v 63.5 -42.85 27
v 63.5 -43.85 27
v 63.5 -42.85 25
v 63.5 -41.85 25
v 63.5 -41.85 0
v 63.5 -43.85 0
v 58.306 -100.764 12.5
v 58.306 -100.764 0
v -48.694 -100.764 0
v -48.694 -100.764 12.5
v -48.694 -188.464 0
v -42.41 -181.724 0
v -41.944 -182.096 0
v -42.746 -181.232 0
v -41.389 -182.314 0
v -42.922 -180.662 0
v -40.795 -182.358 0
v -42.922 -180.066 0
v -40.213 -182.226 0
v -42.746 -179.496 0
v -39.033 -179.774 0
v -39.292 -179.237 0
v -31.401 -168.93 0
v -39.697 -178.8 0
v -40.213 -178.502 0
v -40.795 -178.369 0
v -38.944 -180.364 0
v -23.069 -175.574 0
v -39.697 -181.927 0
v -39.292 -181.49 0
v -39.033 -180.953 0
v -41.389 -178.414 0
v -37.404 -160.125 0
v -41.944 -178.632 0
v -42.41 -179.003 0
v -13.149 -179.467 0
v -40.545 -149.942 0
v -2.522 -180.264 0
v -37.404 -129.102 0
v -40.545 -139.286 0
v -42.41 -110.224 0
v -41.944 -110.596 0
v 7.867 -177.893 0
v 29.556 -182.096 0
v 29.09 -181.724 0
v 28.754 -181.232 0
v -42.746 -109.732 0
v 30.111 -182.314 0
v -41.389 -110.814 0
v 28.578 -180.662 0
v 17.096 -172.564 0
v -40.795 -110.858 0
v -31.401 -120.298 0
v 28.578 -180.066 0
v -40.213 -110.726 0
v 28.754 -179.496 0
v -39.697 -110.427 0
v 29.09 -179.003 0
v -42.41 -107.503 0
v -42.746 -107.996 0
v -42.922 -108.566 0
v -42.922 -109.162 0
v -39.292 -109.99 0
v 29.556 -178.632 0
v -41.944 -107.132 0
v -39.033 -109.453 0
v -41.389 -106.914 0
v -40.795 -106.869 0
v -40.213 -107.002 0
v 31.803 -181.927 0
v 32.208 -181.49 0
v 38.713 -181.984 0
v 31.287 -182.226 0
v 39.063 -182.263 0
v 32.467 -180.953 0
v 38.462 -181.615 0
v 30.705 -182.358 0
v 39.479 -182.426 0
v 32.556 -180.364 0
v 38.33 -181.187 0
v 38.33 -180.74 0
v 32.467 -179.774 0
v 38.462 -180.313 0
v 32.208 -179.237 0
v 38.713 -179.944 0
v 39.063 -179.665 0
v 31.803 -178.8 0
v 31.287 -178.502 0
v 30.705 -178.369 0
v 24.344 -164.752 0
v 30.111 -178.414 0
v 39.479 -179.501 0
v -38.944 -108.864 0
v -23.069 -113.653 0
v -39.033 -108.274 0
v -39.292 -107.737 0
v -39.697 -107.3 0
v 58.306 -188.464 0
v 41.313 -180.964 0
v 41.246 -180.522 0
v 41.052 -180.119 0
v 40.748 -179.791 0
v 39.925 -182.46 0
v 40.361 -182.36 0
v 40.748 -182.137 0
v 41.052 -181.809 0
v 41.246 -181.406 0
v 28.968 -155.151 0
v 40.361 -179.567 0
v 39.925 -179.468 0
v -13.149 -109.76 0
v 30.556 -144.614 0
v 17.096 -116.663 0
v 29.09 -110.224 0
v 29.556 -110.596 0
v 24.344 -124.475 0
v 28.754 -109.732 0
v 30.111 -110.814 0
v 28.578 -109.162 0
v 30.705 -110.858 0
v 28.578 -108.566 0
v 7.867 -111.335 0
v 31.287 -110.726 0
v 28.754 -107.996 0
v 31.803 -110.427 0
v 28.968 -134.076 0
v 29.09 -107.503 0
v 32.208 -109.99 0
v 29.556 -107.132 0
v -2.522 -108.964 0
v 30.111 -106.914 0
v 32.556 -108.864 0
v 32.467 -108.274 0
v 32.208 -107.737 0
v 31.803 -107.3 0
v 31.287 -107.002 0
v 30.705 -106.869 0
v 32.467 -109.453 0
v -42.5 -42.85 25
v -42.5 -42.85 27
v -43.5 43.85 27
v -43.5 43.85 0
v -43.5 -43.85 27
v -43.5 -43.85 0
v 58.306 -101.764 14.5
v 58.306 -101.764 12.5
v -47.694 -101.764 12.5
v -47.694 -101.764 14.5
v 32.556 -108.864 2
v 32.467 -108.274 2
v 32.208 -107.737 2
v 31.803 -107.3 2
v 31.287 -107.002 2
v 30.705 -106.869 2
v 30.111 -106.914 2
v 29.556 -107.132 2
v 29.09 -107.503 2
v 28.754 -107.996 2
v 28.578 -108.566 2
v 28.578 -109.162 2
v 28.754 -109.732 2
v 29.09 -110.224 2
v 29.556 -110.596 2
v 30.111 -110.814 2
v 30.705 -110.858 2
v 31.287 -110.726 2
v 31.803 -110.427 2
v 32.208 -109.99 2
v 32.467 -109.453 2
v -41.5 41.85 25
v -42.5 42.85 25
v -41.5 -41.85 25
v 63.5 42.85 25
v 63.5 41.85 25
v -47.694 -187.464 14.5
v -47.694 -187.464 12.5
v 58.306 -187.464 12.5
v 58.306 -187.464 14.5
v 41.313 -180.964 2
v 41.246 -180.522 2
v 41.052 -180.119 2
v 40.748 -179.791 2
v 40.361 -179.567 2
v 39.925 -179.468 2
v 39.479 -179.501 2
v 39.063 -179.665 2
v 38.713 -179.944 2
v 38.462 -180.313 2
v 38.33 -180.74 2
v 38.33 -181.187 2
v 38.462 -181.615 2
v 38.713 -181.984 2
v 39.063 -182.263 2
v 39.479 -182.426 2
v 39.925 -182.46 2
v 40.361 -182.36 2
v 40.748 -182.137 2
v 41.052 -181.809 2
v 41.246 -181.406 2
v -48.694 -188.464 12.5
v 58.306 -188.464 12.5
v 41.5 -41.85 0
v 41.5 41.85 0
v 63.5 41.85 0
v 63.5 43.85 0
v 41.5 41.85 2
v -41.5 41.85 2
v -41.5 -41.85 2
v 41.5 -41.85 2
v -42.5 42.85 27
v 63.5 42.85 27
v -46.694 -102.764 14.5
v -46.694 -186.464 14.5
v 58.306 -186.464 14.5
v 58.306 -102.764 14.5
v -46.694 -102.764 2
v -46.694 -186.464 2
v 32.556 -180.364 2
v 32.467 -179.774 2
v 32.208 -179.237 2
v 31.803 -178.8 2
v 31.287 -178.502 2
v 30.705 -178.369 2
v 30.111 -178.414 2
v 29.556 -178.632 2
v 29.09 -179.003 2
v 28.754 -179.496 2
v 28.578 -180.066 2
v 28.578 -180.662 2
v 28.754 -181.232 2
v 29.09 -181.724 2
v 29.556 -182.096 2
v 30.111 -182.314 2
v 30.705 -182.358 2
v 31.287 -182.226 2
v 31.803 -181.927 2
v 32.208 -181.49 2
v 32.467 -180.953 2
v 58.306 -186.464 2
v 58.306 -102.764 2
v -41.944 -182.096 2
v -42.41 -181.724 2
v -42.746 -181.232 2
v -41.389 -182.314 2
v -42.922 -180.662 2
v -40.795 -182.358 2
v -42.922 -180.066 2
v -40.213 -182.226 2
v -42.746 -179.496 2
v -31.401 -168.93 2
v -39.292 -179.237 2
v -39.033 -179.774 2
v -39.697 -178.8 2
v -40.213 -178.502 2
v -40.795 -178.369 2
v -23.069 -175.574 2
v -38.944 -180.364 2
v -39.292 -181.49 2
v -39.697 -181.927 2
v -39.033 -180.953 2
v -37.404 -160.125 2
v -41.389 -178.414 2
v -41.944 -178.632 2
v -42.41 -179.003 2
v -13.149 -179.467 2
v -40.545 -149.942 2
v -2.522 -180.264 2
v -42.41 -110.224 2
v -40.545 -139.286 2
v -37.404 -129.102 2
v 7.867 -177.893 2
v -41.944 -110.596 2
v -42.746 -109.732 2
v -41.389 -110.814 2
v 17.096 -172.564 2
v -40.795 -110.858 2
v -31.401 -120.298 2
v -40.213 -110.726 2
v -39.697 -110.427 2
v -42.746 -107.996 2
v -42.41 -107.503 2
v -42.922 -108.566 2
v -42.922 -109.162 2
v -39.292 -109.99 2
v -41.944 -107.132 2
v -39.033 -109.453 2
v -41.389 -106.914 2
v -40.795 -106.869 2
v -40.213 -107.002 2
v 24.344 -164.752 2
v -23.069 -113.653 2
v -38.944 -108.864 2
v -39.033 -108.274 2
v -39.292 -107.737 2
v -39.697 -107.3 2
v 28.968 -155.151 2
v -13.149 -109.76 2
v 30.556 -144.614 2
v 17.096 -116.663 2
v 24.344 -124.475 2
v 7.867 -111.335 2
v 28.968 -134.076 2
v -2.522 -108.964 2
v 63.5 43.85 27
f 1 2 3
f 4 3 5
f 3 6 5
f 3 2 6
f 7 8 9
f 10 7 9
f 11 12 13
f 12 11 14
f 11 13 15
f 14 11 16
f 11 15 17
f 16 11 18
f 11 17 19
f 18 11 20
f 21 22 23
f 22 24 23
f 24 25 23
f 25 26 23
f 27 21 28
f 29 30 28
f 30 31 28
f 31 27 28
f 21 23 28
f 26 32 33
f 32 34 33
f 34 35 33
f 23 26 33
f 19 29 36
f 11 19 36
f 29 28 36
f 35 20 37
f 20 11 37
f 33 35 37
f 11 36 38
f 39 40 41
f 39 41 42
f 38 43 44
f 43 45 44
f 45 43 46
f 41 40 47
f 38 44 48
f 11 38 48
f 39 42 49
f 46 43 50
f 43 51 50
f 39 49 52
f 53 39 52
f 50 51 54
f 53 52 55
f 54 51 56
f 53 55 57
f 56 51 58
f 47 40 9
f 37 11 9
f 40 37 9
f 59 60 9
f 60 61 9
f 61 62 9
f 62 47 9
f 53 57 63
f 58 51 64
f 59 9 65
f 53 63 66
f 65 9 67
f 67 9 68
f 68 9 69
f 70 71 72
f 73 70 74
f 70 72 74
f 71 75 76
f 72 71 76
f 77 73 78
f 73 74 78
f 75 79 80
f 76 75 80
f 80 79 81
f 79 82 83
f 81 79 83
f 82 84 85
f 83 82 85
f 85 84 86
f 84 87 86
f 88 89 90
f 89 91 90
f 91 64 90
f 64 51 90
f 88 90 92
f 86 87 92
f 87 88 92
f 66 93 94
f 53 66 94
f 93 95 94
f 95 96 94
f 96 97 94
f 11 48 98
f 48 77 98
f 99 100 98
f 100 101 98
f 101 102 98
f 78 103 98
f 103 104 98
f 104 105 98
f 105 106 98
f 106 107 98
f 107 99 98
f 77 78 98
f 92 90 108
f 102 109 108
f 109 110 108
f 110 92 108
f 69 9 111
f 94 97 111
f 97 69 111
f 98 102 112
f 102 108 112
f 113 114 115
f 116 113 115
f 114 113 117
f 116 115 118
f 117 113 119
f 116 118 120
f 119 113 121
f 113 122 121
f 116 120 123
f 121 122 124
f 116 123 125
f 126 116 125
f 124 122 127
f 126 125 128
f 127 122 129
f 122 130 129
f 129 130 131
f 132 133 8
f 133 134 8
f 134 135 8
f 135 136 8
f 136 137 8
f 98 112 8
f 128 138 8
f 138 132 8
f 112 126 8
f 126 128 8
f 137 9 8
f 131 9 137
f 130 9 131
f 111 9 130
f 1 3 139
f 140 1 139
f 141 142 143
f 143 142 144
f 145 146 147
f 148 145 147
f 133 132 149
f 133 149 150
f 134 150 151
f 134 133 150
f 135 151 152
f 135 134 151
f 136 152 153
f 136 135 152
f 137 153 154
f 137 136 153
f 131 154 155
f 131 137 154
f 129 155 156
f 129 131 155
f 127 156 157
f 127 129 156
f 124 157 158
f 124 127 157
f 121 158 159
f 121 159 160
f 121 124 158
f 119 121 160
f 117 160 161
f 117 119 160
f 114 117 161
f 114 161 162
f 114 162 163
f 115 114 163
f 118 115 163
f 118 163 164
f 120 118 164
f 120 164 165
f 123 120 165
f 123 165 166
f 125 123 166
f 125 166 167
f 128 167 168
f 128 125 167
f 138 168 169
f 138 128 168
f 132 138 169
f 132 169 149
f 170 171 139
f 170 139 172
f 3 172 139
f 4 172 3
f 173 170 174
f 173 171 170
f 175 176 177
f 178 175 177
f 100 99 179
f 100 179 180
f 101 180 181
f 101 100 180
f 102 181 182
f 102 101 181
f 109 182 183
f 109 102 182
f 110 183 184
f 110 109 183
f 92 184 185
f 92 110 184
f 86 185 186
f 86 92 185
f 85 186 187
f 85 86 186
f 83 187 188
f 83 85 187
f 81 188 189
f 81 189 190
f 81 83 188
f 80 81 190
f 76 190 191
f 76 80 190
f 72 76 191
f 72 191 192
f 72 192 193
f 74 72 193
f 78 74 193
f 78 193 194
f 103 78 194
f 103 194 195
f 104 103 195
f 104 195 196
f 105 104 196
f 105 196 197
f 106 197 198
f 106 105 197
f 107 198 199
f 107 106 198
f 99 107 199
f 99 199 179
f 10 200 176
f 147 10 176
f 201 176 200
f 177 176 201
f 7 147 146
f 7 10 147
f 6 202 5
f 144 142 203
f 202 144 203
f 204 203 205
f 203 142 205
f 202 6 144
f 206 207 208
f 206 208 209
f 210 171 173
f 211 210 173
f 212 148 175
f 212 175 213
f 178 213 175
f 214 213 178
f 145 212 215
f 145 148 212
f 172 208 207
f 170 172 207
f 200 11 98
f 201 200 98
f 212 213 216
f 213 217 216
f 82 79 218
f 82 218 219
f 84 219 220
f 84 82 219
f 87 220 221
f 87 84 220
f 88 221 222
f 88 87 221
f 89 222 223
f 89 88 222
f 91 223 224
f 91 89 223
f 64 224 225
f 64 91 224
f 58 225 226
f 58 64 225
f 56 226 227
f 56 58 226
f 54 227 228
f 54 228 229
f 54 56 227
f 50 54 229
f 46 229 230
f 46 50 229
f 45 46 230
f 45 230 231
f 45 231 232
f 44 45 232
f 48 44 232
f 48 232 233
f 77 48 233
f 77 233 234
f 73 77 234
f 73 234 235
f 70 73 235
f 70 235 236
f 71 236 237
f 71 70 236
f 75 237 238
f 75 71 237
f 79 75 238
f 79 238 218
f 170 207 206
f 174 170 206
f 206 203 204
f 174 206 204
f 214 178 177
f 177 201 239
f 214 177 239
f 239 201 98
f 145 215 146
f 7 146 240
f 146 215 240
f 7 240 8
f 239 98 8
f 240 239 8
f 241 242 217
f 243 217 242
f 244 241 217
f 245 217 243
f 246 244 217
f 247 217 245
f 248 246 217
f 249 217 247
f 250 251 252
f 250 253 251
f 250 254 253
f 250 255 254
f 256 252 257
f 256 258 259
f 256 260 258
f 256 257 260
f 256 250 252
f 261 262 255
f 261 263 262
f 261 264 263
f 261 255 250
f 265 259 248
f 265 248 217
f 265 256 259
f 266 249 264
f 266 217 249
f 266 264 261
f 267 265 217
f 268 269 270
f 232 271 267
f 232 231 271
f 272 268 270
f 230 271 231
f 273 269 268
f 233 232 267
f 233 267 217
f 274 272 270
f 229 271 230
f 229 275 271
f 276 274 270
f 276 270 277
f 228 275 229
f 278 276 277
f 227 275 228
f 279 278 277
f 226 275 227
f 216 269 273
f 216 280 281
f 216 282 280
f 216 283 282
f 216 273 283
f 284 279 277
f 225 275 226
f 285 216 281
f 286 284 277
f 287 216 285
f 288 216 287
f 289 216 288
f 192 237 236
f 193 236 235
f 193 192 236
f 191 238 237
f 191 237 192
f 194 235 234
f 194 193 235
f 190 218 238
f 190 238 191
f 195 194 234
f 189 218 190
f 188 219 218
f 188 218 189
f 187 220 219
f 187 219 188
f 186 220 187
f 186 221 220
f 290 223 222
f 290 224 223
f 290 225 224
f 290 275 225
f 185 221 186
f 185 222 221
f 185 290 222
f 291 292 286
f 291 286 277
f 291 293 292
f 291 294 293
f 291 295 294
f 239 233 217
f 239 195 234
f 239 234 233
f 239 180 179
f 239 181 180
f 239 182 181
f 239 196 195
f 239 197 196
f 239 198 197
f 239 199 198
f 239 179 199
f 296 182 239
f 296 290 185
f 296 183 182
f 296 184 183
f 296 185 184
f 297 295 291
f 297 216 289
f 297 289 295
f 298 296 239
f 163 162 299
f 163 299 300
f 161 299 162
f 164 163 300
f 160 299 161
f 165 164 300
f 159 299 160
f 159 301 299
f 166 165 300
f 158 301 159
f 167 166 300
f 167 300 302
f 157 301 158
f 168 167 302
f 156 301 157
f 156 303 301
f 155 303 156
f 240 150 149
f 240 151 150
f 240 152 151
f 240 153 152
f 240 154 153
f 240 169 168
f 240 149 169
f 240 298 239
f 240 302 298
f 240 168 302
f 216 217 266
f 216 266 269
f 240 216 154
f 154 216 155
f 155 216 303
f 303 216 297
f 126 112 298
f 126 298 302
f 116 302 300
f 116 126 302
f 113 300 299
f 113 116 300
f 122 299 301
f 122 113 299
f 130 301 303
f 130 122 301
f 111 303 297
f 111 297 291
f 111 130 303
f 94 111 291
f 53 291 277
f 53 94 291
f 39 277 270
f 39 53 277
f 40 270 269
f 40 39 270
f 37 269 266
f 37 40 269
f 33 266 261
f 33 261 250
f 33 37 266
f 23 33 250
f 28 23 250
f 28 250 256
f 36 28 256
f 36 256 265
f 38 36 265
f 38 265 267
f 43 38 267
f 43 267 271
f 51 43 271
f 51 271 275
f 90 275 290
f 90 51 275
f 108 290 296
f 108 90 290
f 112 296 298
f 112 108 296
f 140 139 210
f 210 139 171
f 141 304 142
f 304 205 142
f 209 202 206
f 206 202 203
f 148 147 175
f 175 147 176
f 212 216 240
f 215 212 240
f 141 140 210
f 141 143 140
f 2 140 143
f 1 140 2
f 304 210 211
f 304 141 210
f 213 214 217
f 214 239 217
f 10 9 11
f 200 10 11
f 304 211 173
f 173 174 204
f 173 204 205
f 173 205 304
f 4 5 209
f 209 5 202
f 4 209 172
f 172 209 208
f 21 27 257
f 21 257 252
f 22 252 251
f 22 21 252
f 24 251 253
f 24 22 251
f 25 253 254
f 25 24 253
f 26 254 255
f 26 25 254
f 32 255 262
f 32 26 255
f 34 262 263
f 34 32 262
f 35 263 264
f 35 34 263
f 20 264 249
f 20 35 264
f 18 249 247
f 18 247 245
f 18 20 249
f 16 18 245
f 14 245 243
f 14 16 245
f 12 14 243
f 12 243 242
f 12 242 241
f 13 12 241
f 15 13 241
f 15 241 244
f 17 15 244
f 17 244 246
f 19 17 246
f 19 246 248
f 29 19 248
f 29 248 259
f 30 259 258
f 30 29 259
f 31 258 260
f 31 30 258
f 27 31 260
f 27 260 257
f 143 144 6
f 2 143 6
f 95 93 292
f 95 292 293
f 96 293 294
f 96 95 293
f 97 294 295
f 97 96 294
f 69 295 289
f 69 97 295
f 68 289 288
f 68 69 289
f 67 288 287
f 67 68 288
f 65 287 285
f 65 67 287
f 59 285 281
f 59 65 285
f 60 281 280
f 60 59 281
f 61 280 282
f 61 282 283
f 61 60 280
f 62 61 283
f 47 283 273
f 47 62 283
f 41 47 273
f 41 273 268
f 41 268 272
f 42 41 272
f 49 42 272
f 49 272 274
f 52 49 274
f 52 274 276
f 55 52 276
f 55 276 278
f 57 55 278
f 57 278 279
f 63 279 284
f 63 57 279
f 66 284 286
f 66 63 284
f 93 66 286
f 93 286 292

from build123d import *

# Parameters (mm, degrees)
F1_DEPTH  = 25
F0_W      = 83
F0_H      = 83.7
F2_DEPTH  = 2
F5_DEPTH  = 2
F6_DEPTH  = 2
F7_DEPTH  = 12.5
F3_W      = 105
F3_H      = 83.7
F3_R      = 2
F3_R_2    = 1.5
F3_R_3    = 35.75
F8_DEPTH  = 2
F10_DEPTH = 2


with BuildPart() as f1:
    # F0 (on Top) → F1 (new body)
    with BuildSketch(Plane.XY):
        Polygon((63.5, -41.85), (41.5, -41.85), (-41.5, -41.85), (-41.5, 41.85), (41.5, 41.85), (63.5, 41.85), (63.5, 43.85), (-43.5, 43.85), (-43.5, -43.85), (63.5, -43.85), align=None)
    extrude(amount=F1_DEPTH)

    # F0 (on Top) → F2 (join)
    with BuildSketch(Plane.XY):
        Rectangle(F0_W, F0_H)
    extrude(amount=F2_DEPTH)

    # F4 (on face) → F5 (join)
    with BuildSketch(Plane.XY.offset(25)):
        Polygon((63.5, -42.85), (-42.5, -42.85), (-42.5, 42.85), (63.5, 42.85), (63.5, 43.85), (-43.5, 43.85), (-43.5, -43.85), (63.5, -43.85), align=None)
    extrude(amount=F5_DEPTH)


with BuildPart() as f6:
    # F3 (on Top) → F6 (new body)
    with BuildSketch(Plane.XY):
        Polygon((58.305959, -100.763795), (-48.694041, -100.763795), (-48.694041, -188.463795), (58.305959, -188.463795), (58.305959, -186.463795), (-46.694041, -186.463795), (-46.694041, -102.763795), (58.305959, -102.763795), align=None)
    extrude(amount=F6_DEPTH)

    # F3 (on Top) → F7 (join)
    with BuildSketch(Plane.XY):
        Polygon((58.305959, -100.763795), (-48.694041, -100.763795), (-48.694041, -188.463795), (58.305959, -188.463795), (58.305959, -186.463795), (-46.694041, -186.463795), (-46.694041, -102.763795), (58.305959, -102.763795), align=None)
    extrude(amount=F7_DEPTH)

    # F3 (on Top) → F8 (join)
    with BuildSketch(Plane.XY):
        with Locations((5.805959, -144.613795)):
            Rectangle(F3_W, F3_H)
        with Locations((-40.944041, -180.363795)):
            Circle(F3_R, mode=Mode.SUBTRACT)
        with Locations((30.555959, -180.363795)):
            Circle(F3_R, mode=Mode.SUBTRACT)
        with Locations((39.813004, -180.963795)):
            Circle(F3_R_2, mode=Mode.SUBTRACT)
        with Locations((-5.194041, -144.613795)):
            Circle(F3_R_3, mode=Mode.SUBTRACT)
        with Locations((-40.944041, -108.863795)):
            Circle(F3_R, mode=Mode.SUBTRACT)
        with Locations((30.555959, -108.863795)):
            Circle(F3_R, mode=Mode.SUBTRACT)
    extrude(amount=F8_DEPTH)

    # F9 (on face) → F10 (join)
    with BuildSketch(Plane.XY.offset(12.5)):
        Polygon((58.305959, -187.463795), (58.305959, -186.463795), (-46.694041, -186.463795), (-46.694041, -102.763795), (58.305959, -102.763795), (58.305959, -101.763795), (-47.694041, -101.763795), (-47.694041, -187.463795), align=None)
    extrude(amount=F10_DEPTH)


solid = Compound([f1.part, f6.part])
